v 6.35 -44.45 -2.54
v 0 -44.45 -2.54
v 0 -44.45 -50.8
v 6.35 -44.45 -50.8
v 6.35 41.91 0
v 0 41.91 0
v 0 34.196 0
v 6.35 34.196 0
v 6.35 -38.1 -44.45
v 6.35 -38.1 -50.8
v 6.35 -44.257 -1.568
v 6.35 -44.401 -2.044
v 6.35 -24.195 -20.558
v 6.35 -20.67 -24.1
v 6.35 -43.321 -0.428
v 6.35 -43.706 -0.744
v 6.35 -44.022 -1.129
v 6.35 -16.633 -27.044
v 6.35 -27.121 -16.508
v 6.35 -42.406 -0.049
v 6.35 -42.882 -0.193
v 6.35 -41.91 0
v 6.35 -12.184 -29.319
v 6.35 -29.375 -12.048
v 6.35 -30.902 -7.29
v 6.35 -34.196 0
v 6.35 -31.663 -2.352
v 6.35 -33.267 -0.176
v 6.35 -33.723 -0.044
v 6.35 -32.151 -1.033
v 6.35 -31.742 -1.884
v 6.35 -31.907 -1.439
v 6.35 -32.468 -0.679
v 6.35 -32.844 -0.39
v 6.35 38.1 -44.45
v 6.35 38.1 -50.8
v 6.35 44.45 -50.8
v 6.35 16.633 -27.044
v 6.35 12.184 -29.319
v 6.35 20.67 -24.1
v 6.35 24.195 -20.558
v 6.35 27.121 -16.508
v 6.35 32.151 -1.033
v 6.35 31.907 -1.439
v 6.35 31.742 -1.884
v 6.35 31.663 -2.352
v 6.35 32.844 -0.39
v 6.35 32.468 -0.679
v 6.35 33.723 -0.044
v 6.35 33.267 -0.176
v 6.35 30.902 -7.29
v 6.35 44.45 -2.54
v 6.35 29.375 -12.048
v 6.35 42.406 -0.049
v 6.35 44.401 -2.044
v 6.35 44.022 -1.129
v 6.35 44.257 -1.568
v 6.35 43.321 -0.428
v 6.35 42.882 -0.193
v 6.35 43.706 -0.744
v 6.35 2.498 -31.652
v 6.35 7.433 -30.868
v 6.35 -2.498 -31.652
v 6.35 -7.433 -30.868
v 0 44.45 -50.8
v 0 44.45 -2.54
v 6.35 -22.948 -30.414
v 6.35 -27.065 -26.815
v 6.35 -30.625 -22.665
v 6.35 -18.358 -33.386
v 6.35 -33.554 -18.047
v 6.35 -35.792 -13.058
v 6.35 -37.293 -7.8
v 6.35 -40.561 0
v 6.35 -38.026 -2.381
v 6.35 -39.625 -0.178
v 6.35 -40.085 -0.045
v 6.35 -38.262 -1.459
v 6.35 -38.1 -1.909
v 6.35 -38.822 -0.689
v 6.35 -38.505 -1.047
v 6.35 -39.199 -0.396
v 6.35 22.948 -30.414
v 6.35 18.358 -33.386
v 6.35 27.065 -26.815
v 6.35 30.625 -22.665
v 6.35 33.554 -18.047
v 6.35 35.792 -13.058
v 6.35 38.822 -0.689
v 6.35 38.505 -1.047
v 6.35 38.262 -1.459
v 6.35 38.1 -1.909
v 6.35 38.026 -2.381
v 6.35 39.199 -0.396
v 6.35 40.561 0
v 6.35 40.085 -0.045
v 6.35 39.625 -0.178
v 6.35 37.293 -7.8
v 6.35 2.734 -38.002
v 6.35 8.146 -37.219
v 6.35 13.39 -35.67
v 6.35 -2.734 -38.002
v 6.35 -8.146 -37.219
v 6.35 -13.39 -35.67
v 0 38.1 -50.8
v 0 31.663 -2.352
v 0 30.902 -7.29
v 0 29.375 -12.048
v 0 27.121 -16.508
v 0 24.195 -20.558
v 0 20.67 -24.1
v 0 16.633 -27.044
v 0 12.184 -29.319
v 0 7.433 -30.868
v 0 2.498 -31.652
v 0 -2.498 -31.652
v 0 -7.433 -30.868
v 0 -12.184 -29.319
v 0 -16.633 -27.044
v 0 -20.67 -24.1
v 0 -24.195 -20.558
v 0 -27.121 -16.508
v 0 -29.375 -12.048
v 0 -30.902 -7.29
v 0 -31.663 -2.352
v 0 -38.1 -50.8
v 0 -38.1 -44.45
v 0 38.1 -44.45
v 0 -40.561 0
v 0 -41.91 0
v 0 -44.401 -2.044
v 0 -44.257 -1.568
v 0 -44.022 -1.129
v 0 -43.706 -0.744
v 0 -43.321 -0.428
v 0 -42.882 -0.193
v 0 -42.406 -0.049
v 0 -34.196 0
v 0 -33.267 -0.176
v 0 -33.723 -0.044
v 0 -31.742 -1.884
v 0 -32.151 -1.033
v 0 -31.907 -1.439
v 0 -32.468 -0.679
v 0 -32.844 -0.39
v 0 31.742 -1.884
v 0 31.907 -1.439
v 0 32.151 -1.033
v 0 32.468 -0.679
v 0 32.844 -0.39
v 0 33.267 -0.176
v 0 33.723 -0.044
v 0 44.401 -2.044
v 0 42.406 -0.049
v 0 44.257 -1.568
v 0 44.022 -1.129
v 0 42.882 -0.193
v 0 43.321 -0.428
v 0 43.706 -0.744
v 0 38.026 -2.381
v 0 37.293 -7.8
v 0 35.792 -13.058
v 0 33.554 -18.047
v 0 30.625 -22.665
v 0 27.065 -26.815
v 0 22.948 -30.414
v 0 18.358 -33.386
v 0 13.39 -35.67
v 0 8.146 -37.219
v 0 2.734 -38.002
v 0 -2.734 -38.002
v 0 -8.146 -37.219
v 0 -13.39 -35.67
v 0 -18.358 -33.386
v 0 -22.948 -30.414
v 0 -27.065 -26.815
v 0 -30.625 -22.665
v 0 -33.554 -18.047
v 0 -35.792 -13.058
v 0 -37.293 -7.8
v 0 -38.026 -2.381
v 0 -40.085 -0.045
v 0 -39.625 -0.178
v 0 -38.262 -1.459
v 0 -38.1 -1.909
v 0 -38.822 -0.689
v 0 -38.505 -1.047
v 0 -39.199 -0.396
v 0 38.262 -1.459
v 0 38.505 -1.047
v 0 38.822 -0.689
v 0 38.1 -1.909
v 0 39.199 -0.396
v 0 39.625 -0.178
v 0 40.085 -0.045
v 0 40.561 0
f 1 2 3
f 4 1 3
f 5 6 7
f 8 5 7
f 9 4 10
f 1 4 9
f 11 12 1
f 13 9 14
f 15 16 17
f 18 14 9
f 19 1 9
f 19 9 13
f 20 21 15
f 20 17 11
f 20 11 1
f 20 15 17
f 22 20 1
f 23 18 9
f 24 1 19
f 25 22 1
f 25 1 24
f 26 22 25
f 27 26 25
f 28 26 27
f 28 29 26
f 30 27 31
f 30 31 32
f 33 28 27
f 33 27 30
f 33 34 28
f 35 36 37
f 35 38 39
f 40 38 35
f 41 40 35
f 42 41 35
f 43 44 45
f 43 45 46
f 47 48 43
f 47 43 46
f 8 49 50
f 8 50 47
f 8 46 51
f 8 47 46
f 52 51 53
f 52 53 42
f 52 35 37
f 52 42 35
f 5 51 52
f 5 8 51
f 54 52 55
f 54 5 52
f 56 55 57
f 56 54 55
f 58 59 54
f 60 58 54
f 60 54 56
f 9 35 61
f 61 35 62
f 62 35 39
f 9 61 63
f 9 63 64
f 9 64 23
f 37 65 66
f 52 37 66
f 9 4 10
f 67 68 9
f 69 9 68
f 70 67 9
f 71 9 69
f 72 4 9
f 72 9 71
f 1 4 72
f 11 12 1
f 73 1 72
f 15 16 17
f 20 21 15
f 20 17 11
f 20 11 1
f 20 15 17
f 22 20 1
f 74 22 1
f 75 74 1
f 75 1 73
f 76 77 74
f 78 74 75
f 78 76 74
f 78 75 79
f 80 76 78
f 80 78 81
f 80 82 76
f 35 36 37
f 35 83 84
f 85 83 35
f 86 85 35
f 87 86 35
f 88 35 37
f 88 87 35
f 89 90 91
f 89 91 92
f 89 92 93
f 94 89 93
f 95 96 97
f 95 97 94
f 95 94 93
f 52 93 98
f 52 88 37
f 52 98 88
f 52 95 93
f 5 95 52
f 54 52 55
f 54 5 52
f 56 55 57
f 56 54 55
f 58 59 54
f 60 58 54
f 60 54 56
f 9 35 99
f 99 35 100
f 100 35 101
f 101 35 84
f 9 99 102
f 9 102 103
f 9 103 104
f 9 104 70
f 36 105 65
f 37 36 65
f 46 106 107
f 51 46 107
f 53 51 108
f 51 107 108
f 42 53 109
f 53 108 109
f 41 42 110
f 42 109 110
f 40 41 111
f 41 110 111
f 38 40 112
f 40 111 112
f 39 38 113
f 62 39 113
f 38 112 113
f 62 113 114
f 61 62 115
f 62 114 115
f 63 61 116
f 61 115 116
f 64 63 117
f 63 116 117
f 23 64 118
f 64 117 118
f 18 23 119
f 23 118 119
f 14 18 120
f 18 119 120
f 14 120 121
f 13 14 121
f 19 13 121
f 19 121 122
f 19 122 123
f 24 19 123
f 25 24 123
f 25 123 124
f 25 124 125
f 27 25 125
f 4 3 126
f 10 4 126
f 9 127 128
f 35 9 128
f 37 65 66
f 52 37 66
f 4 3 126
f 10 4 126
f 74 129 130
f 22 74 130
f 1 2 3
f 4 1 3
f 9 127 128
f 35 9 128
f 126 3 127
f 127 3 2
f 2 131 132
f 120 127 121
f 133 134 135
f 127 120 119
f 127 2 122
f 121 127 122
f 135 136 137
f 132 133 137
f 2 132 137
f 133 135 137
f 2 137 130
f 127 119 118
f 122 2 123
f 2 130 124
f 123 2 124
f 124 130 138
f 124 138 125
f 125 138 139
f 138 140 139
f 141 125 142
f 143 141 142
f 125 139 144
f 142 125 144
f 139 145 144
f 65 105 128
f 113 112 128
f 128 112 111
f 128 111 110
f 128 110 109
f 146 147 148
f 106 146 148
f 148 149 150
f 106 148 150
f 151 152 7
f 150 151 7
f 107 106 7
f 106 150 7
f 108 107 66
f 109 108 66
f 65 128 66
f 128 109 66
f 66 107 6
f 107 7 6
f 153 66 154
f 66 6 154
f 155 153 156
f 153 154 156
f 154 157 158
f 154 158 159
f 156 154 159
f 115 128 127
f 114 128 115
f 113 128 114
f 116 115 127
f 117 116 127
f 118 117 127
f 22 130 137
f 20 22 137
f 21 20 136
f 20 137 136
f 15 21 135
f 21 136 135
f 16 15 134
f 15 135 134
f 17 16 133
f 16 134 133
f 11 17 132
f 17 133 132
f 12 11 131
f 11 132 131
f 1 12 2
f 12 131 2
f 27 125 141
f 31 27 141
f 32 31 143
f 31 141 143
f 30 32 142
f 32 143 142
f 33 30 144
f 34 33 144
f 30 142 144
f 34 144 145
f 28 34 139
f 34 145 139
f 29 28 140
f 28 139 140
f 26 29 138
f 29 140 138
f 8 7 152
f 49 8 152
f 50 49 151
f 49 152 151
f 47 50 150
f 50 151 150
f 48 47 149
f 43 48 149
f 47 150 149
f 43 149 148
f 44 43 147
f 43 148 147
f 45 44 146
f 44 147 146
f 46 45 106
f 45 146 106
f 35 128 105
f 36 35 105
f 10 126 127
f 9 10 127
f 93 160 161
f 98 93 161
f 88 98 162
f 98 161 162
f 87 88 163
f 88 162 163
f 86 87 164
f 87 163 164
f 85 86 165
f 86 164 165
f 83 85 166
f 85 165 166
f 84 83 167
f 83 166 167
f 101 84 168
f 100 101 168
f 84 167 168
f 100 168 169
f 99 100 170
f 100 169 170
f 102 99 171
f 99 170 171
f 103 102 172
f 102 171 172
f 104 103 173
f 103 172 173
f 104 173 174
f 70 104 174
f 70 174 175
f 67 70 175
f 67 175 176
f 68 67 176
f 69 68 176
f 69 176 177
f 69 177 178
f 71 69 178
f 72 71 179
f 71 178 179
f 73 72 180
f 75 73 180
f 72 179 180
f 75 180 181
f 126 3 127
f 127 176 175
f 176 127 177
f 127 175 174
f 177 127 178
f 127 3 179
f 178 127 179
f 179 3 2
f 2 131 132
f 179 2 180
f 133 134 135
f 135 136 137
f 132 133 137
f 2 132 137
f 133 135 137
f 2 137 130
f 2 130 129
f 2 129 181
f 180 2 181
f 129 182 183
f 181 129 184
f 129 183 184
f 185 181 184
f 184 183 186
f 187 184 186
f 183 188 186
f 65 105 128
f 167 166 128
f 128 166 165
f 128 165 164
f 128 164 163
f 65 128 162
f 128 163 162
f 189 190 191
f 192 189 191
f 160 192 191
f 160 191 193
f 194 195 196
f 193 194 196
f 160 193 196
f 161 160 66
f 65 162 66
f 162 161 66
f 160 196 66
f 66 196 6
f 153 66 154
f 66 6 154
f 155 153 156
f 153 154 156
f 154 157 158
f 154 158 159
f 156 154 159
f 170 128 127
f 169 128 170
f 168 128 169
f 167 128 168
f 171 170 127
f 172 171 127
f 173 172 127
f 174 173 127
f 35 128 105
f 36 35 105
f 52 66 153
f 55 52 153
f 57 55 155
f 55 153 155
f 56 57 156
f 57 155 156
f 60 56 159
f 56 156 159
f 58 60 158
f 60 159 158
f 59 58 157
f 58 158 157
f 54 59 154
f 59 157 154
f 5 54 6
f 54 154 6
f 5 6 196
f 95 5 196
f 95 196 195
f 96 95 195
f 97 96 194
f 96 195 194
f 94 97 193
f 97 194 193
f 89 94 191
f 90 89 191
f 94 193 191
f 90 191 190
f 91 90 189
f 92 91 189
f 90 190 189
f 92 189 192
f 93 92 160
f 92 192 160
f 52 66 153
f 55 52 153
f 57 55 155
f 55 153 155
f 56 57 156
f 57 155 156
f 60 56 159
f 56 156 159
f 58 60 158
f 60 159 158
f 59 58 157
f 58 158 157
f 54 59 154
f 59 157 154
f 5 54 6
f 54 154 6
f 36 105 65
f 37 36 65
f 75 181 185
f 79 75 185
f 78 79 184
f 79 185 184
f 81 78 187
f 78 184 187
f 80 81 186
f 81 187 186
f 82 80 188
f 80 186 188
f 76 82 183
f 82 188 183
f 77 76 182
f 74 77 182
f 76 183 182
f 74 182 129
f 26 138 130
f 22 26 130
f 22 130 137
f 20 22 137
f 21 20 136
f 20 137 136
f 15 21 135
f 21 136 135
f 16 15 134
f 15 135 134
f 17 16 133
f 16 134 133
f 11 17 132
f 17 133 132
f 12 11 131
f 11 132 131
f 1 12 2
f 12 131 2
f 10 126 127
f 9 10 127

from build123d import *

# Parameters (mm, degrees)
F1_DEPTH = 6.35
F3_DEPTH = 6.35
F6_DEPTH = 6.35


with BuildPart() as f1:
    # F0 (on Right) → F1 (new body)
    with BuildSketch(Plane.YZ):
        with BuildLine():
            Line((-34.195797, 0), (-41.91, 0))
            ThreePointArc((-41.91, 0), (-43.706051, -0.743949), (-44.45, -2.54))
            Line((-44.45, -2.54), (-44.45, -44.45))
            Line((-44.45, -44.45), (-44.447301, -44.45))
            Line((-44.447301, -44.45), (-44.447301, -50.8))
            Line((-44.447301, -50.8), (-38.097301, -50.8))
            Line((-38.097301, -50.8), (-38.097301, -44.45))
            Line((-38.097301, -44.45), (38.086154, -44.45))
            Line((38.086154, -44.45), (38.086154, -50.777279))
            Line((38.086154, -50.777279), (44.436154, -50.777279))
            Line((44.436154, -50.777279), (44.436154, -44.45))
            Line((44.436154, -44.45), (44.45, -44.45))
            Line((44.45, -44.45), (44.45, -2.54))
            ThreePointArc((44.45, -2.54), (43.706051, -0.743949), (41.91, 0))
            Line((41.91, 0), (34.195797, 0))
            ThreePointArc((34.195797, 0), (32.467545, -0.678617), (31.662775, -2.351852))
            ThreePointArc((31.662775, -2.351852), (0, -31.75), (-31.662775, -2.351852))
            ThreePointArc((-31.662775, -2.351852), (-32.467545, -0.678617), (-34.195797, 0))
        make_face()
    extrude(amount=F1_DEPTH)


with BuildPart() as f3:
    # F2 (on Right) → F3 (new body)
    with BuildSketch(Plane.YZ):
        with BuildLine():
            Line((-34.195797, 0), (-41.91, 0))
            ThreePointArc((-41.91, 0), (-43.706051, -0.743949), (-44.45, -2.54))
            Line((-44.45, -2.54), (-44.45, -50.8))
            Line((-44.45, -50.8), (-38.1, -50.8))
            Line((-38.1, -50.8), (-38.1, -44.45))
            Line((-38.1, -44.45), (38.1, -44.45))
            Line((38.1, -44.45), (38.1, -50.8))
            Line((38.1, -50.8), (44.45, -50.8))
            Line((44.45, -50.8), (44.45, -2.54))
            ThreePointArc((44.45, -2.54), (43.706051, -0.743949), (41.91, 0))
            Line((41.91, 0), (34.195797, 0))
            ThreePointArc((34.195797, 0), (32.467545, -0.678617), (31.662775, -2.351852))
            ThreePointArc((31.662775, -2.351852), (0, -31.75), (-31.662775, -2.351852))
            ThreePointArc((-31.662775, -2.351852), (-32.467545, -0.678617), (-34.195797, 0))
        make_face()
    extrude(amount=F3_DEPTH)


with BuildPart() as f6:
    # F4 (on Right) → F6 (new body)
    with BuildSketch(Plane.YZ):
        with BuildLine():
            Line((-40.560547, 0), (-41.91, 0))
            ThreePointArc((-41.91, 0), (-43.706051, -0.743949), (-44.45, -2.54))
            Line((-44.45, -2.54), (-44.45, -44.45))
            Line((-44.45, -44.45), (-44.45, -50.8))
            Line((-44.45, -50.8), (-38.1, -50.8))
            Line((-38.1, -50.8), (-38.1, -44.45))
            Line((-38.1, -44.45), (38.1, -44.45))
            Line((38.1, -44.45), (38.1, -50.8))
            Line((38.1, -50.8), (44.45, -50.8))
            Line((44.45, -50.8), (44.45, -44.45))
            Line((44.45, -44.45), (44.45, -2.54))
            ThreePointArc((44.45, -2.54), (43.706051, -0.743949), (41.91, 0))
            Line((41.91, 0), (40.560547, 0))
            ThreePointArc((40.560547, 0), (38.821528, -0.688673), (38.025513, -2.38125))
            ThreePointArc((38.025513, -2.38125), (0, -38.1), (-38.025513, -2.38125))
            ThreePointArc((-38.025513, -2.38125), (-38.821528, -0.688673), (-40.560547, 0))
        make_face()
    extrude(amount=F6_DEPTH)


solid = Compound([f3.part, f6.part])
